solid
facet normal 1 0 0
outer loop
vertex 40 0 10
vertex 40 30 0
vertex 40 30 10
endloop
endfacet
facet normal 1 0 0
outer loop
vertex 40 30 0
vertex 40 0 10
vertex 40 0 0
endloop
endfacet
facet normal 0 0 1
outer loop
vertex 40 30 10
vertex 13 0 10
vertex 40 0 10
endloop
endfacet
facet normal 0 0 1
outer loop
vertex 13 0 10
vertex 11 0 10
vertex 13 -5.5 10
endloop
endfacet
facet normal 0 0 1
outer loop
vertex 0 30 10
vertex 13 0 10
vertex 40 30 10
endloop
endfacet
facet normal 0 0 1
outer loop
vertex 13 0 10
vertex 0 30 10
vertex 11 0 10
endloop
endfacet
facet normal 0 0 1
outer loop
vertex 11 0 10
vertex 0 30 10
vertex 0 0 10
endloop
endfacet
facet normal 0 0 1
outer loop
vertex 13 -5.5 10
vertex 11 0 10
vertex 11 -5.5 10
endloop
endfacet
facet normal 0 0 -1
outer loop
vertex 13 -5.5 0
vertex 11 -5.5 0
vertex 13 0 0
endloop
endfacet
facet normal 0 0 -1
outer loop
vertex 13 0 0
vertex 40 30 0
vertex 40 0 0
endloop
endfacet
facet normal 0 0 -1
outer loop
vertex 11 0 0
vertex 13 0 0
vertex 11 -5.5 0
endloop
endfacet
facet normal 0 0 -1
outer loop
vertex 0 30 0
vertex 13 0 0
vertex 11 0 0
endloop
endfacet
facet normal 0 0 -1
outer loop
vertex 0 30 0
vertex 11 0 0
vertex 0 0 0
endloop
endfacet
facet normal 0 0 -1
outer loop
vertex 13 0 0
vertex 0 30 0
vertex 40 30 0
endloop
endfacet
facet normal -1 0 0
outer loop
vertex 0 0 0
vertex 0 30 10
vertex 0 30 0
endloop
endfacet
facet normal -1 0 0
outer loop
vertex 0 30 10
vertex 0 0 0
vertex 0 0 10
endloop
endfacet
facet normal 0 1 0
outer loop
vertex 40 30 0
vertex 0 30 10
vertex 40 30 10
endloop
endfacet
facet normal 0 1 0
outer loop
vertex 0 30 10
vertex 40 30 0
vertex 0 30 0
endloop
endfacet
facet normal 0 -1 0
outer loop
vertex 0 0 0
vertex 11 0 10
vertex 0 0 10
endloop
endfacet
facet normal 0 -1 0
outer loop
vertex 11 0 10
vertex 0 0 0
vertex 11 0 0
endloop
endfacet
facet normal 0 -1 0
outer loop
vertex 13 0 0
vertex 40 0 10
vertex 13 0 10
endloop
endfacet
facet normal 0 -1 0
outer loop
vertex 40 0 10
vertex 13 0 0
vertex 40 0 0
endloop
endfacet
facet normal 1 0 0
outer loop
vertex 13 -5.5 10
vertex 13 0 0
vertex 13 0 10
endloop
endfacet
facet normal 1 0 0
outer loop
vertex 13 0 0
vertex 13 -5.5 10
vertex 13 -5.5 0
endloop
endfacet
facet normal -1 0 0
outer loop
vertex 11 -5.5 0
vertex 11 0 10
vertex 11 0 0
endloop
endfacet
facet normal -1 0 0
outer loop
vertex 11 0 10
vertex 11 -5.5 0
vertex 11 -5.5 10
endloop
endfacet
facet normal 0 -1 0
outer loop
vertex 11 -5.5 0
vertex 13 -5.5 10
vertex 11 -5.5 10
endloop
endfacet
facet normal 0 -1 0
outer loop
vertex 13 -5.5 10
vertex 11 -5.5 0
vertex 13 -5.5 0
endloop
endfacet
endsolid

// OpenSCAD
// units=mm — generated by scad_emitter.py
// part=unnamed
$fn = 48;

union() { cube([40, 30, 10]); translate([11, -5.5, 0]) cube([2, 6.5, 10]); }
